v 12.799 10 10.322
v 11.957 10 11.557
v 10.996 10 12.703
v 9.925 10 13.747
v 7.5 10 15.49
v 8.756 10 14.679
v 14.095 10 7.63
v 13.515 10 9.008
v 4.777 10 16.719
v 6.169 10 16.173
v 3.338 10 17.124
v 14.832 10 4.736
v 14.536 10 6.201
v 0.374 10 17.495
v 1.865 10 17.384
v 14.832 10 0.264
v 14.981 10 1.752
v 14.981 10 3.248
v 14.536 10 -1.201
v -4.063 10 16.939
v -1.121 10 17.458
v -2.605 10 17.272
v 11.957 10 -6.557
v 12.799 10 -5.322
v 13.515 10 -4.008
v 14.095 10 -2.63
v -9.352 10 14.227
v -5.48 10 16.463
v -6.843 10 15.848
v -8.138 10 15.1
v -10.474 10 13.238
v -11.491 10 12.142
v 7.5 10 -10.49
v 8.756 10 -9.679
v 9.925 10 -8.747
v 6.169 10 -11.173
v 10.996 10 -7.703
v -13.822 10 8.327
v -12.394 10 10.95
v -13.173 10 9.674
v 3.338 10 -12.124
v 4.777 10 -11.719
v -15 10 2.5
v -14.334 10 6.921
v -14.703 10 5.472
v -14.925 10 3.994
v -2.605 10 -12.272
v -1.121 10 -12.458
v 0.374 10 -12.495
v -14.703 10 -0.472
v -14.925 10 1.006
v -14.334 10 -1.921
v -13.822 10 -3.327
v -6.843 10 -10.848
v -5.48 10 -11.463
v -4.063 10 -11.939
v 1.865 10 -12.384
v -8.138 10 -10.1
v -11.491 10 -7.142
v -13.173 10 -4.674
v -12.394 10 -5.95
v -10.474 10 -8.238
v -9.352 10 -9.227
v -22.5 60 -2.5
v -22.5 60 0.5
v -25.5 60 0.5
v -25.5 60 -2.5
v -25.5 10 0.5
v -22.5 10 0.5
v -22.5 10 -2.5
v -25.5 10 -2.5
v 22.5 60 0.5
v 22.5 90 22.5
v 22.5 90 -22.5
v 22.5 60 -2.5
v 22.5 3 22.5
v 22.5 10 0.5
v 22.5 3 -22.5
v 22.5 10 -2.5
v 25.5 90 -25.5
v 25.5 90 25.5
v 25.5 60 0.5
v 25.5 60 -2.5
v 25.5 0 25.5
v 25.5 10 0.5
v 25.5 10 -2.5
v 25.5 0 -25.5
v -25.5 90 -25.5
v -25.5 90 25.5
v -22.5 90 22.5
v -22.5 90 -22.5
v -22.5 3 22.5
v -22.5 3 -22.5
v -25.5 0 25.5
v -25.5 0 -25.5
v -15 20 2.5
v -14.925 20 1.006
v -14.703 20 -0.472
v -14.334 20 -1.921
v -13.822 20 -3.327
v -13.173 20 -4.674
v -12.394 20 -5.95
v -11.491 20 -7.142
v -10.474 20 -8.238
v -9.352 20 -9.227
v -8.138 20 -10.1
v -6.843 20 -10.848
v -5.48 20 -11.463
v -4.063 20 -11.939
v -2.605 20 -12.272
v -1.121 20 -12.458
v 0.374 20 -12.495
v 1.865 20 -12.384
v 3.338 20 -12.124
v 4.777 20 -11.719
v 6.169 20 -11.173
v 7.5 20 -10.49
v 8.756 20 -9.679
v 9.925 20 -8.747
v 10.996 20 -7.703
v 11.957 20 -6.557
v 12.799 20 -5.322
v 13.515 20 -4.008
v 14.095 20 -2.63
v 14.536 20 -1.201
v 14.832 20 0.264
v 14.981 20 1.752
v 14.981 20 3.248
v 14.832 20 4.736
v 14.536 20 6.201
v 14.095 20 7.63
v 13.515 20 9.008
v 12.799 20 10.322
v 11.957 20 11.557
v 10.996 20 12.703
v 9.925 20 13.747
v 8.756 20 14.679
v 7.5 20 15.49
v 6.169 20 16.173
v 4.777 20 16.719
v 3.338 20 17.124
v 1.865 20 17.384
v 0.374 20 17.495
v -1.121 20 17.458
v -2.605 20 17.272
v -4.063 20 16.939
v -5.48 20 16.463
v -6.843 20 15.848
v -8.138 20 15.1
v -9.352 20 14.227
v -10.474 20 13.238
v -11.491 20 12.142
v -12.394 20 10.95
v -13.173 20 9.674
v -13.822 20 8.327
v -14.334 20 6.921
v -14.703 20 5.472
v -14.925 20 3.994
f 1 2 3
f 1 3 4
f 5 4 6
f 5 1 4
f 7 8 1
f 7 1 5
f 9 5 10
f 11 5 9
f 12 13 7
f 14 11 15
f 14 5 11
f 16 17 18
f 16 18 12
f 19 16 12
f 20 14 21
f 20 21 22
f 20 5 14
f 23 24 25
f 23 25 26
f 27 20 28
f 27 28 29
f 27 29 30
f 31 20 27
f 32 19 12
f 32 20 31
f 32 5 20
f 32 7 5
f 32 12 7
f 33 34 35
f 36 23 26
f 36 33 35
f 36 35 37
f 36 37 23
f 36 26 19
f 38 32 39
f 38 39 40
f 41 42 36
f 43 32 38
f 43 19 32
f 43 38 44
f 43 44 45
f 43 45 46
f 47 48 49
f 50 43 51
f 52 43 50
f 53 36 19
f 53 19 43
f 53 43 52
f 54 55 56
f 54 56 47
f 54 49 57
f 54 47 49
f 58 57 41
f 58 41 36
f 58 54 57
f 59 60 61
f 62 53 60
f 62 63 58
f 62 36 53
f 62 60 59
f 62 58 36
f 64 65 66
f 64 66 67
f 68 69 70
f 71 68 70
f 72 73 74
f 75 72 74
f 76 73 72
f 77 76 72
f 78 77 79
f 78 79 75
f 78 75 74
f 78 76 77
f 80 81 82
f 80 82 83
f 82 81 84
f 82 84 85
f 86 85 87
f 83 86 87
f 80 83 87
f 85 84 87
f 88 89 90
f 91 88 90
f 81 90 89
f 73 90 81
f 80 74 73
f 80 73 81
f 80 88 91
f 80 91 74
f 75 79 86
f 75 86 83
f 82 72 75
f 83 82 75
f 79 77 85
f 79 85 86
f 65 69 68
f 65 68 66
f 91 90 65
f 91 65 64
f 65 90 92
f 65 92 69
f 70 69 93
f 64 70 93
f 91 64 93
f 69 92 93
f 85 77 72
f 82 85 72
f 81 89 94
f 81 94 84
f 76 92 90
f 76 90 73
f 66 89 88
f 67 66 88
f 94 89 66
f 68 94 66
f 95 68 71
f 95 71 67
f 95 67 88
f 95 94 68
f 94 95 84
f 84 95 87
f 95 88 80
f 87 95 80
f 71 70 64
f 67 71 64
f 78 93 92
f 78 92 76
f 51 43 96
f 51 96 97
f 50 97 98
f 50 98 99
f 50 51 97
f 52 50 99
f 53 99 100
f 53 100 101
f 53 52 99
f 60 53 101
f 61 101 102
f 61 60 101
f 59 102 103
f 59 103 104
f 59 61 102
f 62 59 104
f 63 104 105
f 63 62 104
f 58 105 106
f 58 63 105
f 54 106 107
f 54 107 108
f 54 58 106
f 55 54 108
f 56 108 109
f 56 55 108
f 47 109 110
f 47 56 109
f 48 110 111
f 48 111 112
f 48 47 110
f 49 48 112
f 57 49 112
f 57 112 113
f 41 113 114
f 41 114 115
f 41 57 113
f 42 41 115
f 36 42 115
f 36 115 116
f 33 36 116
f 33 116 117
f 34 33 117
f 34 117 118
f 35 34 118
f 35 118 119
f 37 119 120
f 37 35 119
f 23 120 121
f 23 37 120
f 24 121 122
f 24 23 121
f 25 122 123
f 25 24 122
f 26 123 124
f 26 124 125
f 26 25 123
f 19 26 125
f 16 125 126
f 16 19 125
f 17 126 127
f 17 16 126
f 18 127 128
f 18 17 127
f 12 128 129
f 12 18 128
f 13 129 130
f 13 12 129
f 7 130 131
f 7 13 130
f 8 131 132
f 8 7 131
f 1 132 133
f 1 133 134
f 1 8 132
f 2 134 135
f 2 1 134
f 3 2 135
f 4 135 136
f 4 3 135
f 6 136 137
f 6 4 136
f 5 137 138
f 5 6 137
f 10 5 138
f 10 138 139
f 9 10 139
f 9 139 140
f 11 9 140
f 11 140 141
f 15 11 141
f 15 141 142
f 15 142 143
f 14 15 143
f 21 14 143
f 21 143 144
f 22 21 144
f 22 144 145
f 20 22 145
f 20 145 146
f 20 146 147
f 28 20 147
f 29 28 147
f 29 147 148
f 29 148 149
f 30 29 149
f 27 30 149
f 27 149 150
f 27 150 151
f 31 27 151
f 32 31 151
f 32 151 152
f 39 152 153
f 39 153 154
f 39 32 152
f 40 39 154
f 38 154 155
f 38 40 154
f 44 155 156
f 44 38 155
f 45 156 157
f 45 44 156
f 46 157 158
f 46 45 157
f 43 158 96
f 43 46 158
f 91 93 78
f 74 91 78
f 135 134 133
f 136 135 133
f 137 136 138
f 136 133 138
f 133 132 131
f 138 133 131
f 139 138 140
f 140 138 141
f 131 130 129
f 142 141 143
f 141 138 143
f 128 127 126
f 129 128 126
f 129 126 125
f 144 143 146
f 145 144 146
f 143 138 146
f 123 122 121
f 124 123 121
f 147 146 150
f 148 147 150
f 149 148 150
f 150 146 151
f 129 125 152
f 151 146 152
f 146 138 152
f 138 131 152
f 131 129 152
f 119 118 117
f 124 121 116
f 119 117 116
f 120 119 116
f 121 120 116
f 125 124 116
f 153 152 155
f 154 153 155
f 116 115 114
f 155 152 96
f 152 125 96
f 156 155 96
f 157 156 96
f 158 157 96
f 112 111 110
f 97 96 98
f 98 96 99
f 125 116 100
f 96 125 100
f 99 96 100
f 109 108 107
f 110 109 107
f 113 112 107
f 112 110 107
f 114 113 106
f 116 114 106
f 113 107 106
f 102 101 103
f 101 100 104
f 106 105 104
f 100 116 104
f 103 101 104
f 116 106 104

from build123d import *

# Parameters (mm, degrees)
SKETCH1_W               = 51
SKETCH1_H               = 51
BOSS_EXTRUDE1_DEPTH     = 90
SHELL1_T                = -3
SKETCH2_W               = 3
SKETCH2_H               = 50
CUT_EXTRUDE1_DEPTH      = 26.5
CUT_EXTRUDE1_DEPTH_BACK = 26.5
SKETCH5_R               = 15
BOSS_EXTRUDE3_DEPTH     = 10


with BuildPart() as part:
    # Sketch1 → Boss-Extrude1 (new body)
    with BuildSketch(Plane(origin=(0, 0, 0), x_dir=(1, 0, 0), z_dir=(0, 1, 0))):
        Rectangle(SKETCH1_W, SKETCH1_H)
    extrude(amount=BOSS_EXTRUDE1_DEPTH)

    # Shell1
    shell1_openings = [part.faces().sort_by_distance(p)[0] for p in [
        (0, 90, 0),
    ]]
    offset(amount=SHELL1_T, openings=shell1_openings, kind=Kind.INTERSECTION)

    # Sketch2 → Cut-Extrude1 (cut, two sides)
    with BuildSketch(Plane(origin=(0, 0, 0), x_dir=(0, 0, -1), z_dir=(1, 0, 0))) as cut_extrude1_sk:
        with Locations((1, 35)):
            Rectangle(SKETCH2_W, SKETCH2_H)
    extrude(amount=CUT_EXTRUDE1_DEPTH, mode=Mode.SUBTRACT)
    extrude(cut_extrude1_sk.sketch, amount=-CUT_EXTRUDE1_DEPTH_BACK, mode=Mode.SUBTRACT)


with BuildPart() as body_2:
    # Sketch5 → Boss-Extrude3 (new body)
    with BuildSketch(Plane(origin=(0, 10, 0), x_dir=(-1, 0, 0), z_dir=(0, -1, 0))):
        with Locations((0, -2.5)):
            Circle(SKETCH5_R)
    extrude(amount=-BOSS_EXTRUDE3_DEPTH)


solid = Compound([part.part, body_2.part])
